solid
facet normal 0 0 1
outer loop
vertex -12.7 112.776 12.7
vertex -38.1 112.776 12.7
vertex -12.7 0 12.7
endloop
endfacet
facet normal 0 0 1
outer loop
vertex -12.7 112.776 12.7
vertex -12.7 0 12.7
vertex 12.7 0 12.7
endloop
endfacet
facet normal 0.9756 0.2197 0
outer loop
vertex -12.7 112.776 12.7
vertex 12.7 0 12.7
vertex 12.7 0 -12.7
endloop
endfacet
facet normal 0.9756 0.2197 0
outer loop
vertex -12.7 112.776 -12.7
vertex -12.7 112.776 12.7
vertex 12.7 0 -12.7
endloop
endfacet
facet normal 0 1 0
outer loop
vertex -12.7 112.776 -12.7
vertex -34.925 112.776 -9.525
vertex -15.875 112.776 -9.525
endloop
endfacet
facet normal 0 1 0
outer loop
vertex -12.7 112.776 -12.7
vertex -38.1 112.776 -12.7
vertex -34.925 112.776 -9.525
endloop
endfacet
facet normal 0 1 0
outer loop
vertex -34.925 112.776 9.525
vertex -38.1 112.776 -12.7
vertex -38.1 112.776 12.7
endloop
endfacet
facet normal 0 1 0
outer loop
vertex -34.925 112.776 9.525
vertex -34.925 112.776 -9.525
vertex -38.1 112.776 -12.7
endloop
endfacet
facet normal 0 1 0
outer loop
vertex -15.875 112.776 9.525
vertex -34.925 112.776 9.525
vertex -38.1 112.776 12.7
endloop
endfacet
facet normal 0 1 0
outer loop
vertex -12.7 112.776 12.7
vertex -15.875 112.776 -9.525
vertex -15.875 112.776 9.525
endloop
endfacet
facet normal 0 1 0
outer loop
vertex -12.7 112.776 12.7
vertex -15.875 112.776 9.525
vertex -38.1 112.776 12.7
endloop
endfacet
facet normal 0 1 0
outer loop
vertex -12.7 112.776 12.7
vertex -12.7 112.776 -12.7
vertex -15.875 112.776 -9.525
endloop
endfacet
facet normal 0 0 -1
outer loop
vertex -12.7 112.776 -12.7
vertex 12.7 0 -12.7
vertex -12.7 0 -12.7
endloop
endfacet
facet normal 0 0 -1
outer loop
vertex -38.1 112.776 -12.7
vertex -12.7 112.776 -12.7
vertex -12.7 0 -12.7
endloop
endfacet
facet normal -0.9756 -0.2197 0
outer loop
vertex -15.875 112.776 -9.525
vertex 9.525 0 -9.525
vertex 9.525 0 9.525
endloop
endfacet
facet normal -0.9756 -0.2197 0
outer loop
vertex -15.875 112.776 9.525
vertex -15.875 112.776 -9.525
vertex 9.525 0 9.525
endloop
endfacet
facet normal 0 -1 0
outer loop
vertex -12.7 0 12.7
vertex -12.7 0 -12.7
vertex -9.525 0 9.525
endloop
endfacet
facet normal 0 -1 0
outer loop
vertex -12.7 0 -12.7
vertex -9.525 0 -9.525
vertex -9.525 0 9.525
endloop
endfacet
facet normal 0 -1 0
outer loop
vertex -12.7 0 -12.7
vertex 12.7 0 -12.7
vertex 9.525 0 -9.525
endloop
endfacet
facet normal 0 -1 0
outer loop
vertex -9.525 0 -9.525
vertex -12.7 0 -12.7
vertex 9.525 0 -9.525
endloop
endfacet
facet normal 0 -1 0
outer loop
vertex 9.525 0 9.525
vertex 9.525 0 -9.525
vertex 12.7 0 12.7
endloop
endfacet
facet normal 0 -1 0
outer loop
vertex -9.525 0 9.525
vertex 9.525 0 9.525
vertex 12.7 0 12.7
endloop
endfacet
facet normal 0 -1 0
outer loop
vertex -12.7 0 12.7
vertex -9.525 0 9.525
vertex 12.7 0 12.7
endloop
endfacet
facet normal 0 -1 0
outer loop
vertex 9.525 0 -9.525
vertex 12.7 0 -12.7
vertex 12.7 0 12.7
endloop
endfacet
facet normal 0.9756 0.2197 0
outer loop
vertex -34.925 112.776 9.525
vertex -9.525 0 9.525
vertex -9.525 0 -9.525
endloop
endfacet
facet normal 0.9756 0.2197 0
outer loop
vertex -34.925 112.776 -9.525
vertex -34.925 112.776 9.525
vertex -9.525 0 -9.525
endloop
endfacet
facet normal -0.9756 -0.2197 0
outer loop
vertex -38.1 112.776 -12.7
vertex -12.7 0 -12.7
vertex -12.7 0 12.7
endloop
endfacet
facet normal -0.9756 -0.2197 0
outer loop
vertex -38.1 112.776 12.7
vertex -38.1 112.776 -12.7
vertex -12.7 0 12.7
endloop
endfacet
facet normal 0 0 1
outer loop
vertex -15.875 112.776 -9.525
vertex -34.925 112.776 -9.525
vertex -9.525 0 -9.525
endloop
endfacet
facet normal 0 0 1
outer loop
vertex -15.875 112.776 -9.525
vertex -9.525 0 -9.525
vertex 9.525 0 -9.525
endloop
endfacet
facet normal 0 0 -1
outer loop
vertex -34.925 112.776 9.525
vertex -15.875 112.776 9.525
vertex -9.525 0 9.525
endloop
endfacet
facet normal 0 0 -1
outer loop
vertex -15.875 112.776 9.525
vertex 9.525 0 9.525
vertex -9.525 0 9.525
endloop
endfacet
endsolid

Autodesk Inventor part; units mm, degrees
ref_plane "YZ Plane" through (0, 0, 0) normal (1, 0, 0) x (0, 1, 0)
ref_plane "XY Plane" through (0, 0, 0) normal (0, 0, 1) x (1, 0, 0)
sketch "Sketch1" plane through (0, 0, 0) normal (0, 1, 0) x (-1, 0, 0)
  line L0 (-12.7, -12.7) -> (12.7, -12.7)
  line L1 (12.7, -12.7) -> (12.7, 12.7)
  line L2 (12.7, 12.7) -> (-12.7, 12.7)
  line L3 (-12.7, 12.7) -> (-12.7, -12.7)
  line L4 (-12.7, -12.7) -> (12.7, 12.7) construction
  line L5 (12.7, -12.7) -> (-12.7, 12.7) construction
  line L6 (9.525, 9.525) -> (9.525, -9.525)
  line L7 (9.525, -9.525) -> (-9.525, -9.525)
  line L8 (-9.525, -9.525) -> (-9.525, 9.525)
  line L9 (-9.525, 9.525) -> (9.525, 9.525)
  point P0 (0, 0)
  dimension "d0" = 25.4
  dimension "d1" = 25.4
  dimension "d2" = 3.175
ref_plane "Work Plane1" through (0, 112.776, 0) normal (0, 1, 0) x (-1, 0, 0)
sketch "Sketch2" plane through (0, 112.776, 0) normal (0, 1, 0) x (-1, 0, 0)
  line L0 (38.1, -12.7) -> (12.7, -12.7)
  line L1 (12.7, -12.7) -> (12.7, 12.7)
  line L2 (12.7, 12.7) -> (38.1, 12.7)
  line L3 (38.1, 12.7) -> (38.1, -12.7)
  line L4 (38.1, -12.7) -> (12.7, 12.7) construction
  line L5 (12.7, -12.7) -> (38.1, 12.7) construction
  line L6 (34.925, 9.525) -> (15.875, 9.525)
  line L7 (15.875, 9.525) -> (15.875, -9.525)
  line L8 (15.875, -9.525) -> (34.925, -9.525)
  line L9 (34.925, -9.525) -> (34.925, 9.525)
  point P0 (0, 0)
  point P1 (25.4, 0)
  point P2 (38.1, 0)
  dimension "d6" = 25.4
  dimension "d7" = 25.4
  dimension "d8" = 3.175
sketch "Sketch3" plane through (0, 0, 0) normal (0, 0, 1) x (1, 0, 0)
  line L0 (-12.7, 112.776) -> (-38.1, 112.776) construction
  line L1 (-25.4, 112.776) -> (0, 0)
sweep "Sweep1" add profiles "Sketch1" path "Sketch3"
properties part number "STRU_006_BilletPole_4.44in"
